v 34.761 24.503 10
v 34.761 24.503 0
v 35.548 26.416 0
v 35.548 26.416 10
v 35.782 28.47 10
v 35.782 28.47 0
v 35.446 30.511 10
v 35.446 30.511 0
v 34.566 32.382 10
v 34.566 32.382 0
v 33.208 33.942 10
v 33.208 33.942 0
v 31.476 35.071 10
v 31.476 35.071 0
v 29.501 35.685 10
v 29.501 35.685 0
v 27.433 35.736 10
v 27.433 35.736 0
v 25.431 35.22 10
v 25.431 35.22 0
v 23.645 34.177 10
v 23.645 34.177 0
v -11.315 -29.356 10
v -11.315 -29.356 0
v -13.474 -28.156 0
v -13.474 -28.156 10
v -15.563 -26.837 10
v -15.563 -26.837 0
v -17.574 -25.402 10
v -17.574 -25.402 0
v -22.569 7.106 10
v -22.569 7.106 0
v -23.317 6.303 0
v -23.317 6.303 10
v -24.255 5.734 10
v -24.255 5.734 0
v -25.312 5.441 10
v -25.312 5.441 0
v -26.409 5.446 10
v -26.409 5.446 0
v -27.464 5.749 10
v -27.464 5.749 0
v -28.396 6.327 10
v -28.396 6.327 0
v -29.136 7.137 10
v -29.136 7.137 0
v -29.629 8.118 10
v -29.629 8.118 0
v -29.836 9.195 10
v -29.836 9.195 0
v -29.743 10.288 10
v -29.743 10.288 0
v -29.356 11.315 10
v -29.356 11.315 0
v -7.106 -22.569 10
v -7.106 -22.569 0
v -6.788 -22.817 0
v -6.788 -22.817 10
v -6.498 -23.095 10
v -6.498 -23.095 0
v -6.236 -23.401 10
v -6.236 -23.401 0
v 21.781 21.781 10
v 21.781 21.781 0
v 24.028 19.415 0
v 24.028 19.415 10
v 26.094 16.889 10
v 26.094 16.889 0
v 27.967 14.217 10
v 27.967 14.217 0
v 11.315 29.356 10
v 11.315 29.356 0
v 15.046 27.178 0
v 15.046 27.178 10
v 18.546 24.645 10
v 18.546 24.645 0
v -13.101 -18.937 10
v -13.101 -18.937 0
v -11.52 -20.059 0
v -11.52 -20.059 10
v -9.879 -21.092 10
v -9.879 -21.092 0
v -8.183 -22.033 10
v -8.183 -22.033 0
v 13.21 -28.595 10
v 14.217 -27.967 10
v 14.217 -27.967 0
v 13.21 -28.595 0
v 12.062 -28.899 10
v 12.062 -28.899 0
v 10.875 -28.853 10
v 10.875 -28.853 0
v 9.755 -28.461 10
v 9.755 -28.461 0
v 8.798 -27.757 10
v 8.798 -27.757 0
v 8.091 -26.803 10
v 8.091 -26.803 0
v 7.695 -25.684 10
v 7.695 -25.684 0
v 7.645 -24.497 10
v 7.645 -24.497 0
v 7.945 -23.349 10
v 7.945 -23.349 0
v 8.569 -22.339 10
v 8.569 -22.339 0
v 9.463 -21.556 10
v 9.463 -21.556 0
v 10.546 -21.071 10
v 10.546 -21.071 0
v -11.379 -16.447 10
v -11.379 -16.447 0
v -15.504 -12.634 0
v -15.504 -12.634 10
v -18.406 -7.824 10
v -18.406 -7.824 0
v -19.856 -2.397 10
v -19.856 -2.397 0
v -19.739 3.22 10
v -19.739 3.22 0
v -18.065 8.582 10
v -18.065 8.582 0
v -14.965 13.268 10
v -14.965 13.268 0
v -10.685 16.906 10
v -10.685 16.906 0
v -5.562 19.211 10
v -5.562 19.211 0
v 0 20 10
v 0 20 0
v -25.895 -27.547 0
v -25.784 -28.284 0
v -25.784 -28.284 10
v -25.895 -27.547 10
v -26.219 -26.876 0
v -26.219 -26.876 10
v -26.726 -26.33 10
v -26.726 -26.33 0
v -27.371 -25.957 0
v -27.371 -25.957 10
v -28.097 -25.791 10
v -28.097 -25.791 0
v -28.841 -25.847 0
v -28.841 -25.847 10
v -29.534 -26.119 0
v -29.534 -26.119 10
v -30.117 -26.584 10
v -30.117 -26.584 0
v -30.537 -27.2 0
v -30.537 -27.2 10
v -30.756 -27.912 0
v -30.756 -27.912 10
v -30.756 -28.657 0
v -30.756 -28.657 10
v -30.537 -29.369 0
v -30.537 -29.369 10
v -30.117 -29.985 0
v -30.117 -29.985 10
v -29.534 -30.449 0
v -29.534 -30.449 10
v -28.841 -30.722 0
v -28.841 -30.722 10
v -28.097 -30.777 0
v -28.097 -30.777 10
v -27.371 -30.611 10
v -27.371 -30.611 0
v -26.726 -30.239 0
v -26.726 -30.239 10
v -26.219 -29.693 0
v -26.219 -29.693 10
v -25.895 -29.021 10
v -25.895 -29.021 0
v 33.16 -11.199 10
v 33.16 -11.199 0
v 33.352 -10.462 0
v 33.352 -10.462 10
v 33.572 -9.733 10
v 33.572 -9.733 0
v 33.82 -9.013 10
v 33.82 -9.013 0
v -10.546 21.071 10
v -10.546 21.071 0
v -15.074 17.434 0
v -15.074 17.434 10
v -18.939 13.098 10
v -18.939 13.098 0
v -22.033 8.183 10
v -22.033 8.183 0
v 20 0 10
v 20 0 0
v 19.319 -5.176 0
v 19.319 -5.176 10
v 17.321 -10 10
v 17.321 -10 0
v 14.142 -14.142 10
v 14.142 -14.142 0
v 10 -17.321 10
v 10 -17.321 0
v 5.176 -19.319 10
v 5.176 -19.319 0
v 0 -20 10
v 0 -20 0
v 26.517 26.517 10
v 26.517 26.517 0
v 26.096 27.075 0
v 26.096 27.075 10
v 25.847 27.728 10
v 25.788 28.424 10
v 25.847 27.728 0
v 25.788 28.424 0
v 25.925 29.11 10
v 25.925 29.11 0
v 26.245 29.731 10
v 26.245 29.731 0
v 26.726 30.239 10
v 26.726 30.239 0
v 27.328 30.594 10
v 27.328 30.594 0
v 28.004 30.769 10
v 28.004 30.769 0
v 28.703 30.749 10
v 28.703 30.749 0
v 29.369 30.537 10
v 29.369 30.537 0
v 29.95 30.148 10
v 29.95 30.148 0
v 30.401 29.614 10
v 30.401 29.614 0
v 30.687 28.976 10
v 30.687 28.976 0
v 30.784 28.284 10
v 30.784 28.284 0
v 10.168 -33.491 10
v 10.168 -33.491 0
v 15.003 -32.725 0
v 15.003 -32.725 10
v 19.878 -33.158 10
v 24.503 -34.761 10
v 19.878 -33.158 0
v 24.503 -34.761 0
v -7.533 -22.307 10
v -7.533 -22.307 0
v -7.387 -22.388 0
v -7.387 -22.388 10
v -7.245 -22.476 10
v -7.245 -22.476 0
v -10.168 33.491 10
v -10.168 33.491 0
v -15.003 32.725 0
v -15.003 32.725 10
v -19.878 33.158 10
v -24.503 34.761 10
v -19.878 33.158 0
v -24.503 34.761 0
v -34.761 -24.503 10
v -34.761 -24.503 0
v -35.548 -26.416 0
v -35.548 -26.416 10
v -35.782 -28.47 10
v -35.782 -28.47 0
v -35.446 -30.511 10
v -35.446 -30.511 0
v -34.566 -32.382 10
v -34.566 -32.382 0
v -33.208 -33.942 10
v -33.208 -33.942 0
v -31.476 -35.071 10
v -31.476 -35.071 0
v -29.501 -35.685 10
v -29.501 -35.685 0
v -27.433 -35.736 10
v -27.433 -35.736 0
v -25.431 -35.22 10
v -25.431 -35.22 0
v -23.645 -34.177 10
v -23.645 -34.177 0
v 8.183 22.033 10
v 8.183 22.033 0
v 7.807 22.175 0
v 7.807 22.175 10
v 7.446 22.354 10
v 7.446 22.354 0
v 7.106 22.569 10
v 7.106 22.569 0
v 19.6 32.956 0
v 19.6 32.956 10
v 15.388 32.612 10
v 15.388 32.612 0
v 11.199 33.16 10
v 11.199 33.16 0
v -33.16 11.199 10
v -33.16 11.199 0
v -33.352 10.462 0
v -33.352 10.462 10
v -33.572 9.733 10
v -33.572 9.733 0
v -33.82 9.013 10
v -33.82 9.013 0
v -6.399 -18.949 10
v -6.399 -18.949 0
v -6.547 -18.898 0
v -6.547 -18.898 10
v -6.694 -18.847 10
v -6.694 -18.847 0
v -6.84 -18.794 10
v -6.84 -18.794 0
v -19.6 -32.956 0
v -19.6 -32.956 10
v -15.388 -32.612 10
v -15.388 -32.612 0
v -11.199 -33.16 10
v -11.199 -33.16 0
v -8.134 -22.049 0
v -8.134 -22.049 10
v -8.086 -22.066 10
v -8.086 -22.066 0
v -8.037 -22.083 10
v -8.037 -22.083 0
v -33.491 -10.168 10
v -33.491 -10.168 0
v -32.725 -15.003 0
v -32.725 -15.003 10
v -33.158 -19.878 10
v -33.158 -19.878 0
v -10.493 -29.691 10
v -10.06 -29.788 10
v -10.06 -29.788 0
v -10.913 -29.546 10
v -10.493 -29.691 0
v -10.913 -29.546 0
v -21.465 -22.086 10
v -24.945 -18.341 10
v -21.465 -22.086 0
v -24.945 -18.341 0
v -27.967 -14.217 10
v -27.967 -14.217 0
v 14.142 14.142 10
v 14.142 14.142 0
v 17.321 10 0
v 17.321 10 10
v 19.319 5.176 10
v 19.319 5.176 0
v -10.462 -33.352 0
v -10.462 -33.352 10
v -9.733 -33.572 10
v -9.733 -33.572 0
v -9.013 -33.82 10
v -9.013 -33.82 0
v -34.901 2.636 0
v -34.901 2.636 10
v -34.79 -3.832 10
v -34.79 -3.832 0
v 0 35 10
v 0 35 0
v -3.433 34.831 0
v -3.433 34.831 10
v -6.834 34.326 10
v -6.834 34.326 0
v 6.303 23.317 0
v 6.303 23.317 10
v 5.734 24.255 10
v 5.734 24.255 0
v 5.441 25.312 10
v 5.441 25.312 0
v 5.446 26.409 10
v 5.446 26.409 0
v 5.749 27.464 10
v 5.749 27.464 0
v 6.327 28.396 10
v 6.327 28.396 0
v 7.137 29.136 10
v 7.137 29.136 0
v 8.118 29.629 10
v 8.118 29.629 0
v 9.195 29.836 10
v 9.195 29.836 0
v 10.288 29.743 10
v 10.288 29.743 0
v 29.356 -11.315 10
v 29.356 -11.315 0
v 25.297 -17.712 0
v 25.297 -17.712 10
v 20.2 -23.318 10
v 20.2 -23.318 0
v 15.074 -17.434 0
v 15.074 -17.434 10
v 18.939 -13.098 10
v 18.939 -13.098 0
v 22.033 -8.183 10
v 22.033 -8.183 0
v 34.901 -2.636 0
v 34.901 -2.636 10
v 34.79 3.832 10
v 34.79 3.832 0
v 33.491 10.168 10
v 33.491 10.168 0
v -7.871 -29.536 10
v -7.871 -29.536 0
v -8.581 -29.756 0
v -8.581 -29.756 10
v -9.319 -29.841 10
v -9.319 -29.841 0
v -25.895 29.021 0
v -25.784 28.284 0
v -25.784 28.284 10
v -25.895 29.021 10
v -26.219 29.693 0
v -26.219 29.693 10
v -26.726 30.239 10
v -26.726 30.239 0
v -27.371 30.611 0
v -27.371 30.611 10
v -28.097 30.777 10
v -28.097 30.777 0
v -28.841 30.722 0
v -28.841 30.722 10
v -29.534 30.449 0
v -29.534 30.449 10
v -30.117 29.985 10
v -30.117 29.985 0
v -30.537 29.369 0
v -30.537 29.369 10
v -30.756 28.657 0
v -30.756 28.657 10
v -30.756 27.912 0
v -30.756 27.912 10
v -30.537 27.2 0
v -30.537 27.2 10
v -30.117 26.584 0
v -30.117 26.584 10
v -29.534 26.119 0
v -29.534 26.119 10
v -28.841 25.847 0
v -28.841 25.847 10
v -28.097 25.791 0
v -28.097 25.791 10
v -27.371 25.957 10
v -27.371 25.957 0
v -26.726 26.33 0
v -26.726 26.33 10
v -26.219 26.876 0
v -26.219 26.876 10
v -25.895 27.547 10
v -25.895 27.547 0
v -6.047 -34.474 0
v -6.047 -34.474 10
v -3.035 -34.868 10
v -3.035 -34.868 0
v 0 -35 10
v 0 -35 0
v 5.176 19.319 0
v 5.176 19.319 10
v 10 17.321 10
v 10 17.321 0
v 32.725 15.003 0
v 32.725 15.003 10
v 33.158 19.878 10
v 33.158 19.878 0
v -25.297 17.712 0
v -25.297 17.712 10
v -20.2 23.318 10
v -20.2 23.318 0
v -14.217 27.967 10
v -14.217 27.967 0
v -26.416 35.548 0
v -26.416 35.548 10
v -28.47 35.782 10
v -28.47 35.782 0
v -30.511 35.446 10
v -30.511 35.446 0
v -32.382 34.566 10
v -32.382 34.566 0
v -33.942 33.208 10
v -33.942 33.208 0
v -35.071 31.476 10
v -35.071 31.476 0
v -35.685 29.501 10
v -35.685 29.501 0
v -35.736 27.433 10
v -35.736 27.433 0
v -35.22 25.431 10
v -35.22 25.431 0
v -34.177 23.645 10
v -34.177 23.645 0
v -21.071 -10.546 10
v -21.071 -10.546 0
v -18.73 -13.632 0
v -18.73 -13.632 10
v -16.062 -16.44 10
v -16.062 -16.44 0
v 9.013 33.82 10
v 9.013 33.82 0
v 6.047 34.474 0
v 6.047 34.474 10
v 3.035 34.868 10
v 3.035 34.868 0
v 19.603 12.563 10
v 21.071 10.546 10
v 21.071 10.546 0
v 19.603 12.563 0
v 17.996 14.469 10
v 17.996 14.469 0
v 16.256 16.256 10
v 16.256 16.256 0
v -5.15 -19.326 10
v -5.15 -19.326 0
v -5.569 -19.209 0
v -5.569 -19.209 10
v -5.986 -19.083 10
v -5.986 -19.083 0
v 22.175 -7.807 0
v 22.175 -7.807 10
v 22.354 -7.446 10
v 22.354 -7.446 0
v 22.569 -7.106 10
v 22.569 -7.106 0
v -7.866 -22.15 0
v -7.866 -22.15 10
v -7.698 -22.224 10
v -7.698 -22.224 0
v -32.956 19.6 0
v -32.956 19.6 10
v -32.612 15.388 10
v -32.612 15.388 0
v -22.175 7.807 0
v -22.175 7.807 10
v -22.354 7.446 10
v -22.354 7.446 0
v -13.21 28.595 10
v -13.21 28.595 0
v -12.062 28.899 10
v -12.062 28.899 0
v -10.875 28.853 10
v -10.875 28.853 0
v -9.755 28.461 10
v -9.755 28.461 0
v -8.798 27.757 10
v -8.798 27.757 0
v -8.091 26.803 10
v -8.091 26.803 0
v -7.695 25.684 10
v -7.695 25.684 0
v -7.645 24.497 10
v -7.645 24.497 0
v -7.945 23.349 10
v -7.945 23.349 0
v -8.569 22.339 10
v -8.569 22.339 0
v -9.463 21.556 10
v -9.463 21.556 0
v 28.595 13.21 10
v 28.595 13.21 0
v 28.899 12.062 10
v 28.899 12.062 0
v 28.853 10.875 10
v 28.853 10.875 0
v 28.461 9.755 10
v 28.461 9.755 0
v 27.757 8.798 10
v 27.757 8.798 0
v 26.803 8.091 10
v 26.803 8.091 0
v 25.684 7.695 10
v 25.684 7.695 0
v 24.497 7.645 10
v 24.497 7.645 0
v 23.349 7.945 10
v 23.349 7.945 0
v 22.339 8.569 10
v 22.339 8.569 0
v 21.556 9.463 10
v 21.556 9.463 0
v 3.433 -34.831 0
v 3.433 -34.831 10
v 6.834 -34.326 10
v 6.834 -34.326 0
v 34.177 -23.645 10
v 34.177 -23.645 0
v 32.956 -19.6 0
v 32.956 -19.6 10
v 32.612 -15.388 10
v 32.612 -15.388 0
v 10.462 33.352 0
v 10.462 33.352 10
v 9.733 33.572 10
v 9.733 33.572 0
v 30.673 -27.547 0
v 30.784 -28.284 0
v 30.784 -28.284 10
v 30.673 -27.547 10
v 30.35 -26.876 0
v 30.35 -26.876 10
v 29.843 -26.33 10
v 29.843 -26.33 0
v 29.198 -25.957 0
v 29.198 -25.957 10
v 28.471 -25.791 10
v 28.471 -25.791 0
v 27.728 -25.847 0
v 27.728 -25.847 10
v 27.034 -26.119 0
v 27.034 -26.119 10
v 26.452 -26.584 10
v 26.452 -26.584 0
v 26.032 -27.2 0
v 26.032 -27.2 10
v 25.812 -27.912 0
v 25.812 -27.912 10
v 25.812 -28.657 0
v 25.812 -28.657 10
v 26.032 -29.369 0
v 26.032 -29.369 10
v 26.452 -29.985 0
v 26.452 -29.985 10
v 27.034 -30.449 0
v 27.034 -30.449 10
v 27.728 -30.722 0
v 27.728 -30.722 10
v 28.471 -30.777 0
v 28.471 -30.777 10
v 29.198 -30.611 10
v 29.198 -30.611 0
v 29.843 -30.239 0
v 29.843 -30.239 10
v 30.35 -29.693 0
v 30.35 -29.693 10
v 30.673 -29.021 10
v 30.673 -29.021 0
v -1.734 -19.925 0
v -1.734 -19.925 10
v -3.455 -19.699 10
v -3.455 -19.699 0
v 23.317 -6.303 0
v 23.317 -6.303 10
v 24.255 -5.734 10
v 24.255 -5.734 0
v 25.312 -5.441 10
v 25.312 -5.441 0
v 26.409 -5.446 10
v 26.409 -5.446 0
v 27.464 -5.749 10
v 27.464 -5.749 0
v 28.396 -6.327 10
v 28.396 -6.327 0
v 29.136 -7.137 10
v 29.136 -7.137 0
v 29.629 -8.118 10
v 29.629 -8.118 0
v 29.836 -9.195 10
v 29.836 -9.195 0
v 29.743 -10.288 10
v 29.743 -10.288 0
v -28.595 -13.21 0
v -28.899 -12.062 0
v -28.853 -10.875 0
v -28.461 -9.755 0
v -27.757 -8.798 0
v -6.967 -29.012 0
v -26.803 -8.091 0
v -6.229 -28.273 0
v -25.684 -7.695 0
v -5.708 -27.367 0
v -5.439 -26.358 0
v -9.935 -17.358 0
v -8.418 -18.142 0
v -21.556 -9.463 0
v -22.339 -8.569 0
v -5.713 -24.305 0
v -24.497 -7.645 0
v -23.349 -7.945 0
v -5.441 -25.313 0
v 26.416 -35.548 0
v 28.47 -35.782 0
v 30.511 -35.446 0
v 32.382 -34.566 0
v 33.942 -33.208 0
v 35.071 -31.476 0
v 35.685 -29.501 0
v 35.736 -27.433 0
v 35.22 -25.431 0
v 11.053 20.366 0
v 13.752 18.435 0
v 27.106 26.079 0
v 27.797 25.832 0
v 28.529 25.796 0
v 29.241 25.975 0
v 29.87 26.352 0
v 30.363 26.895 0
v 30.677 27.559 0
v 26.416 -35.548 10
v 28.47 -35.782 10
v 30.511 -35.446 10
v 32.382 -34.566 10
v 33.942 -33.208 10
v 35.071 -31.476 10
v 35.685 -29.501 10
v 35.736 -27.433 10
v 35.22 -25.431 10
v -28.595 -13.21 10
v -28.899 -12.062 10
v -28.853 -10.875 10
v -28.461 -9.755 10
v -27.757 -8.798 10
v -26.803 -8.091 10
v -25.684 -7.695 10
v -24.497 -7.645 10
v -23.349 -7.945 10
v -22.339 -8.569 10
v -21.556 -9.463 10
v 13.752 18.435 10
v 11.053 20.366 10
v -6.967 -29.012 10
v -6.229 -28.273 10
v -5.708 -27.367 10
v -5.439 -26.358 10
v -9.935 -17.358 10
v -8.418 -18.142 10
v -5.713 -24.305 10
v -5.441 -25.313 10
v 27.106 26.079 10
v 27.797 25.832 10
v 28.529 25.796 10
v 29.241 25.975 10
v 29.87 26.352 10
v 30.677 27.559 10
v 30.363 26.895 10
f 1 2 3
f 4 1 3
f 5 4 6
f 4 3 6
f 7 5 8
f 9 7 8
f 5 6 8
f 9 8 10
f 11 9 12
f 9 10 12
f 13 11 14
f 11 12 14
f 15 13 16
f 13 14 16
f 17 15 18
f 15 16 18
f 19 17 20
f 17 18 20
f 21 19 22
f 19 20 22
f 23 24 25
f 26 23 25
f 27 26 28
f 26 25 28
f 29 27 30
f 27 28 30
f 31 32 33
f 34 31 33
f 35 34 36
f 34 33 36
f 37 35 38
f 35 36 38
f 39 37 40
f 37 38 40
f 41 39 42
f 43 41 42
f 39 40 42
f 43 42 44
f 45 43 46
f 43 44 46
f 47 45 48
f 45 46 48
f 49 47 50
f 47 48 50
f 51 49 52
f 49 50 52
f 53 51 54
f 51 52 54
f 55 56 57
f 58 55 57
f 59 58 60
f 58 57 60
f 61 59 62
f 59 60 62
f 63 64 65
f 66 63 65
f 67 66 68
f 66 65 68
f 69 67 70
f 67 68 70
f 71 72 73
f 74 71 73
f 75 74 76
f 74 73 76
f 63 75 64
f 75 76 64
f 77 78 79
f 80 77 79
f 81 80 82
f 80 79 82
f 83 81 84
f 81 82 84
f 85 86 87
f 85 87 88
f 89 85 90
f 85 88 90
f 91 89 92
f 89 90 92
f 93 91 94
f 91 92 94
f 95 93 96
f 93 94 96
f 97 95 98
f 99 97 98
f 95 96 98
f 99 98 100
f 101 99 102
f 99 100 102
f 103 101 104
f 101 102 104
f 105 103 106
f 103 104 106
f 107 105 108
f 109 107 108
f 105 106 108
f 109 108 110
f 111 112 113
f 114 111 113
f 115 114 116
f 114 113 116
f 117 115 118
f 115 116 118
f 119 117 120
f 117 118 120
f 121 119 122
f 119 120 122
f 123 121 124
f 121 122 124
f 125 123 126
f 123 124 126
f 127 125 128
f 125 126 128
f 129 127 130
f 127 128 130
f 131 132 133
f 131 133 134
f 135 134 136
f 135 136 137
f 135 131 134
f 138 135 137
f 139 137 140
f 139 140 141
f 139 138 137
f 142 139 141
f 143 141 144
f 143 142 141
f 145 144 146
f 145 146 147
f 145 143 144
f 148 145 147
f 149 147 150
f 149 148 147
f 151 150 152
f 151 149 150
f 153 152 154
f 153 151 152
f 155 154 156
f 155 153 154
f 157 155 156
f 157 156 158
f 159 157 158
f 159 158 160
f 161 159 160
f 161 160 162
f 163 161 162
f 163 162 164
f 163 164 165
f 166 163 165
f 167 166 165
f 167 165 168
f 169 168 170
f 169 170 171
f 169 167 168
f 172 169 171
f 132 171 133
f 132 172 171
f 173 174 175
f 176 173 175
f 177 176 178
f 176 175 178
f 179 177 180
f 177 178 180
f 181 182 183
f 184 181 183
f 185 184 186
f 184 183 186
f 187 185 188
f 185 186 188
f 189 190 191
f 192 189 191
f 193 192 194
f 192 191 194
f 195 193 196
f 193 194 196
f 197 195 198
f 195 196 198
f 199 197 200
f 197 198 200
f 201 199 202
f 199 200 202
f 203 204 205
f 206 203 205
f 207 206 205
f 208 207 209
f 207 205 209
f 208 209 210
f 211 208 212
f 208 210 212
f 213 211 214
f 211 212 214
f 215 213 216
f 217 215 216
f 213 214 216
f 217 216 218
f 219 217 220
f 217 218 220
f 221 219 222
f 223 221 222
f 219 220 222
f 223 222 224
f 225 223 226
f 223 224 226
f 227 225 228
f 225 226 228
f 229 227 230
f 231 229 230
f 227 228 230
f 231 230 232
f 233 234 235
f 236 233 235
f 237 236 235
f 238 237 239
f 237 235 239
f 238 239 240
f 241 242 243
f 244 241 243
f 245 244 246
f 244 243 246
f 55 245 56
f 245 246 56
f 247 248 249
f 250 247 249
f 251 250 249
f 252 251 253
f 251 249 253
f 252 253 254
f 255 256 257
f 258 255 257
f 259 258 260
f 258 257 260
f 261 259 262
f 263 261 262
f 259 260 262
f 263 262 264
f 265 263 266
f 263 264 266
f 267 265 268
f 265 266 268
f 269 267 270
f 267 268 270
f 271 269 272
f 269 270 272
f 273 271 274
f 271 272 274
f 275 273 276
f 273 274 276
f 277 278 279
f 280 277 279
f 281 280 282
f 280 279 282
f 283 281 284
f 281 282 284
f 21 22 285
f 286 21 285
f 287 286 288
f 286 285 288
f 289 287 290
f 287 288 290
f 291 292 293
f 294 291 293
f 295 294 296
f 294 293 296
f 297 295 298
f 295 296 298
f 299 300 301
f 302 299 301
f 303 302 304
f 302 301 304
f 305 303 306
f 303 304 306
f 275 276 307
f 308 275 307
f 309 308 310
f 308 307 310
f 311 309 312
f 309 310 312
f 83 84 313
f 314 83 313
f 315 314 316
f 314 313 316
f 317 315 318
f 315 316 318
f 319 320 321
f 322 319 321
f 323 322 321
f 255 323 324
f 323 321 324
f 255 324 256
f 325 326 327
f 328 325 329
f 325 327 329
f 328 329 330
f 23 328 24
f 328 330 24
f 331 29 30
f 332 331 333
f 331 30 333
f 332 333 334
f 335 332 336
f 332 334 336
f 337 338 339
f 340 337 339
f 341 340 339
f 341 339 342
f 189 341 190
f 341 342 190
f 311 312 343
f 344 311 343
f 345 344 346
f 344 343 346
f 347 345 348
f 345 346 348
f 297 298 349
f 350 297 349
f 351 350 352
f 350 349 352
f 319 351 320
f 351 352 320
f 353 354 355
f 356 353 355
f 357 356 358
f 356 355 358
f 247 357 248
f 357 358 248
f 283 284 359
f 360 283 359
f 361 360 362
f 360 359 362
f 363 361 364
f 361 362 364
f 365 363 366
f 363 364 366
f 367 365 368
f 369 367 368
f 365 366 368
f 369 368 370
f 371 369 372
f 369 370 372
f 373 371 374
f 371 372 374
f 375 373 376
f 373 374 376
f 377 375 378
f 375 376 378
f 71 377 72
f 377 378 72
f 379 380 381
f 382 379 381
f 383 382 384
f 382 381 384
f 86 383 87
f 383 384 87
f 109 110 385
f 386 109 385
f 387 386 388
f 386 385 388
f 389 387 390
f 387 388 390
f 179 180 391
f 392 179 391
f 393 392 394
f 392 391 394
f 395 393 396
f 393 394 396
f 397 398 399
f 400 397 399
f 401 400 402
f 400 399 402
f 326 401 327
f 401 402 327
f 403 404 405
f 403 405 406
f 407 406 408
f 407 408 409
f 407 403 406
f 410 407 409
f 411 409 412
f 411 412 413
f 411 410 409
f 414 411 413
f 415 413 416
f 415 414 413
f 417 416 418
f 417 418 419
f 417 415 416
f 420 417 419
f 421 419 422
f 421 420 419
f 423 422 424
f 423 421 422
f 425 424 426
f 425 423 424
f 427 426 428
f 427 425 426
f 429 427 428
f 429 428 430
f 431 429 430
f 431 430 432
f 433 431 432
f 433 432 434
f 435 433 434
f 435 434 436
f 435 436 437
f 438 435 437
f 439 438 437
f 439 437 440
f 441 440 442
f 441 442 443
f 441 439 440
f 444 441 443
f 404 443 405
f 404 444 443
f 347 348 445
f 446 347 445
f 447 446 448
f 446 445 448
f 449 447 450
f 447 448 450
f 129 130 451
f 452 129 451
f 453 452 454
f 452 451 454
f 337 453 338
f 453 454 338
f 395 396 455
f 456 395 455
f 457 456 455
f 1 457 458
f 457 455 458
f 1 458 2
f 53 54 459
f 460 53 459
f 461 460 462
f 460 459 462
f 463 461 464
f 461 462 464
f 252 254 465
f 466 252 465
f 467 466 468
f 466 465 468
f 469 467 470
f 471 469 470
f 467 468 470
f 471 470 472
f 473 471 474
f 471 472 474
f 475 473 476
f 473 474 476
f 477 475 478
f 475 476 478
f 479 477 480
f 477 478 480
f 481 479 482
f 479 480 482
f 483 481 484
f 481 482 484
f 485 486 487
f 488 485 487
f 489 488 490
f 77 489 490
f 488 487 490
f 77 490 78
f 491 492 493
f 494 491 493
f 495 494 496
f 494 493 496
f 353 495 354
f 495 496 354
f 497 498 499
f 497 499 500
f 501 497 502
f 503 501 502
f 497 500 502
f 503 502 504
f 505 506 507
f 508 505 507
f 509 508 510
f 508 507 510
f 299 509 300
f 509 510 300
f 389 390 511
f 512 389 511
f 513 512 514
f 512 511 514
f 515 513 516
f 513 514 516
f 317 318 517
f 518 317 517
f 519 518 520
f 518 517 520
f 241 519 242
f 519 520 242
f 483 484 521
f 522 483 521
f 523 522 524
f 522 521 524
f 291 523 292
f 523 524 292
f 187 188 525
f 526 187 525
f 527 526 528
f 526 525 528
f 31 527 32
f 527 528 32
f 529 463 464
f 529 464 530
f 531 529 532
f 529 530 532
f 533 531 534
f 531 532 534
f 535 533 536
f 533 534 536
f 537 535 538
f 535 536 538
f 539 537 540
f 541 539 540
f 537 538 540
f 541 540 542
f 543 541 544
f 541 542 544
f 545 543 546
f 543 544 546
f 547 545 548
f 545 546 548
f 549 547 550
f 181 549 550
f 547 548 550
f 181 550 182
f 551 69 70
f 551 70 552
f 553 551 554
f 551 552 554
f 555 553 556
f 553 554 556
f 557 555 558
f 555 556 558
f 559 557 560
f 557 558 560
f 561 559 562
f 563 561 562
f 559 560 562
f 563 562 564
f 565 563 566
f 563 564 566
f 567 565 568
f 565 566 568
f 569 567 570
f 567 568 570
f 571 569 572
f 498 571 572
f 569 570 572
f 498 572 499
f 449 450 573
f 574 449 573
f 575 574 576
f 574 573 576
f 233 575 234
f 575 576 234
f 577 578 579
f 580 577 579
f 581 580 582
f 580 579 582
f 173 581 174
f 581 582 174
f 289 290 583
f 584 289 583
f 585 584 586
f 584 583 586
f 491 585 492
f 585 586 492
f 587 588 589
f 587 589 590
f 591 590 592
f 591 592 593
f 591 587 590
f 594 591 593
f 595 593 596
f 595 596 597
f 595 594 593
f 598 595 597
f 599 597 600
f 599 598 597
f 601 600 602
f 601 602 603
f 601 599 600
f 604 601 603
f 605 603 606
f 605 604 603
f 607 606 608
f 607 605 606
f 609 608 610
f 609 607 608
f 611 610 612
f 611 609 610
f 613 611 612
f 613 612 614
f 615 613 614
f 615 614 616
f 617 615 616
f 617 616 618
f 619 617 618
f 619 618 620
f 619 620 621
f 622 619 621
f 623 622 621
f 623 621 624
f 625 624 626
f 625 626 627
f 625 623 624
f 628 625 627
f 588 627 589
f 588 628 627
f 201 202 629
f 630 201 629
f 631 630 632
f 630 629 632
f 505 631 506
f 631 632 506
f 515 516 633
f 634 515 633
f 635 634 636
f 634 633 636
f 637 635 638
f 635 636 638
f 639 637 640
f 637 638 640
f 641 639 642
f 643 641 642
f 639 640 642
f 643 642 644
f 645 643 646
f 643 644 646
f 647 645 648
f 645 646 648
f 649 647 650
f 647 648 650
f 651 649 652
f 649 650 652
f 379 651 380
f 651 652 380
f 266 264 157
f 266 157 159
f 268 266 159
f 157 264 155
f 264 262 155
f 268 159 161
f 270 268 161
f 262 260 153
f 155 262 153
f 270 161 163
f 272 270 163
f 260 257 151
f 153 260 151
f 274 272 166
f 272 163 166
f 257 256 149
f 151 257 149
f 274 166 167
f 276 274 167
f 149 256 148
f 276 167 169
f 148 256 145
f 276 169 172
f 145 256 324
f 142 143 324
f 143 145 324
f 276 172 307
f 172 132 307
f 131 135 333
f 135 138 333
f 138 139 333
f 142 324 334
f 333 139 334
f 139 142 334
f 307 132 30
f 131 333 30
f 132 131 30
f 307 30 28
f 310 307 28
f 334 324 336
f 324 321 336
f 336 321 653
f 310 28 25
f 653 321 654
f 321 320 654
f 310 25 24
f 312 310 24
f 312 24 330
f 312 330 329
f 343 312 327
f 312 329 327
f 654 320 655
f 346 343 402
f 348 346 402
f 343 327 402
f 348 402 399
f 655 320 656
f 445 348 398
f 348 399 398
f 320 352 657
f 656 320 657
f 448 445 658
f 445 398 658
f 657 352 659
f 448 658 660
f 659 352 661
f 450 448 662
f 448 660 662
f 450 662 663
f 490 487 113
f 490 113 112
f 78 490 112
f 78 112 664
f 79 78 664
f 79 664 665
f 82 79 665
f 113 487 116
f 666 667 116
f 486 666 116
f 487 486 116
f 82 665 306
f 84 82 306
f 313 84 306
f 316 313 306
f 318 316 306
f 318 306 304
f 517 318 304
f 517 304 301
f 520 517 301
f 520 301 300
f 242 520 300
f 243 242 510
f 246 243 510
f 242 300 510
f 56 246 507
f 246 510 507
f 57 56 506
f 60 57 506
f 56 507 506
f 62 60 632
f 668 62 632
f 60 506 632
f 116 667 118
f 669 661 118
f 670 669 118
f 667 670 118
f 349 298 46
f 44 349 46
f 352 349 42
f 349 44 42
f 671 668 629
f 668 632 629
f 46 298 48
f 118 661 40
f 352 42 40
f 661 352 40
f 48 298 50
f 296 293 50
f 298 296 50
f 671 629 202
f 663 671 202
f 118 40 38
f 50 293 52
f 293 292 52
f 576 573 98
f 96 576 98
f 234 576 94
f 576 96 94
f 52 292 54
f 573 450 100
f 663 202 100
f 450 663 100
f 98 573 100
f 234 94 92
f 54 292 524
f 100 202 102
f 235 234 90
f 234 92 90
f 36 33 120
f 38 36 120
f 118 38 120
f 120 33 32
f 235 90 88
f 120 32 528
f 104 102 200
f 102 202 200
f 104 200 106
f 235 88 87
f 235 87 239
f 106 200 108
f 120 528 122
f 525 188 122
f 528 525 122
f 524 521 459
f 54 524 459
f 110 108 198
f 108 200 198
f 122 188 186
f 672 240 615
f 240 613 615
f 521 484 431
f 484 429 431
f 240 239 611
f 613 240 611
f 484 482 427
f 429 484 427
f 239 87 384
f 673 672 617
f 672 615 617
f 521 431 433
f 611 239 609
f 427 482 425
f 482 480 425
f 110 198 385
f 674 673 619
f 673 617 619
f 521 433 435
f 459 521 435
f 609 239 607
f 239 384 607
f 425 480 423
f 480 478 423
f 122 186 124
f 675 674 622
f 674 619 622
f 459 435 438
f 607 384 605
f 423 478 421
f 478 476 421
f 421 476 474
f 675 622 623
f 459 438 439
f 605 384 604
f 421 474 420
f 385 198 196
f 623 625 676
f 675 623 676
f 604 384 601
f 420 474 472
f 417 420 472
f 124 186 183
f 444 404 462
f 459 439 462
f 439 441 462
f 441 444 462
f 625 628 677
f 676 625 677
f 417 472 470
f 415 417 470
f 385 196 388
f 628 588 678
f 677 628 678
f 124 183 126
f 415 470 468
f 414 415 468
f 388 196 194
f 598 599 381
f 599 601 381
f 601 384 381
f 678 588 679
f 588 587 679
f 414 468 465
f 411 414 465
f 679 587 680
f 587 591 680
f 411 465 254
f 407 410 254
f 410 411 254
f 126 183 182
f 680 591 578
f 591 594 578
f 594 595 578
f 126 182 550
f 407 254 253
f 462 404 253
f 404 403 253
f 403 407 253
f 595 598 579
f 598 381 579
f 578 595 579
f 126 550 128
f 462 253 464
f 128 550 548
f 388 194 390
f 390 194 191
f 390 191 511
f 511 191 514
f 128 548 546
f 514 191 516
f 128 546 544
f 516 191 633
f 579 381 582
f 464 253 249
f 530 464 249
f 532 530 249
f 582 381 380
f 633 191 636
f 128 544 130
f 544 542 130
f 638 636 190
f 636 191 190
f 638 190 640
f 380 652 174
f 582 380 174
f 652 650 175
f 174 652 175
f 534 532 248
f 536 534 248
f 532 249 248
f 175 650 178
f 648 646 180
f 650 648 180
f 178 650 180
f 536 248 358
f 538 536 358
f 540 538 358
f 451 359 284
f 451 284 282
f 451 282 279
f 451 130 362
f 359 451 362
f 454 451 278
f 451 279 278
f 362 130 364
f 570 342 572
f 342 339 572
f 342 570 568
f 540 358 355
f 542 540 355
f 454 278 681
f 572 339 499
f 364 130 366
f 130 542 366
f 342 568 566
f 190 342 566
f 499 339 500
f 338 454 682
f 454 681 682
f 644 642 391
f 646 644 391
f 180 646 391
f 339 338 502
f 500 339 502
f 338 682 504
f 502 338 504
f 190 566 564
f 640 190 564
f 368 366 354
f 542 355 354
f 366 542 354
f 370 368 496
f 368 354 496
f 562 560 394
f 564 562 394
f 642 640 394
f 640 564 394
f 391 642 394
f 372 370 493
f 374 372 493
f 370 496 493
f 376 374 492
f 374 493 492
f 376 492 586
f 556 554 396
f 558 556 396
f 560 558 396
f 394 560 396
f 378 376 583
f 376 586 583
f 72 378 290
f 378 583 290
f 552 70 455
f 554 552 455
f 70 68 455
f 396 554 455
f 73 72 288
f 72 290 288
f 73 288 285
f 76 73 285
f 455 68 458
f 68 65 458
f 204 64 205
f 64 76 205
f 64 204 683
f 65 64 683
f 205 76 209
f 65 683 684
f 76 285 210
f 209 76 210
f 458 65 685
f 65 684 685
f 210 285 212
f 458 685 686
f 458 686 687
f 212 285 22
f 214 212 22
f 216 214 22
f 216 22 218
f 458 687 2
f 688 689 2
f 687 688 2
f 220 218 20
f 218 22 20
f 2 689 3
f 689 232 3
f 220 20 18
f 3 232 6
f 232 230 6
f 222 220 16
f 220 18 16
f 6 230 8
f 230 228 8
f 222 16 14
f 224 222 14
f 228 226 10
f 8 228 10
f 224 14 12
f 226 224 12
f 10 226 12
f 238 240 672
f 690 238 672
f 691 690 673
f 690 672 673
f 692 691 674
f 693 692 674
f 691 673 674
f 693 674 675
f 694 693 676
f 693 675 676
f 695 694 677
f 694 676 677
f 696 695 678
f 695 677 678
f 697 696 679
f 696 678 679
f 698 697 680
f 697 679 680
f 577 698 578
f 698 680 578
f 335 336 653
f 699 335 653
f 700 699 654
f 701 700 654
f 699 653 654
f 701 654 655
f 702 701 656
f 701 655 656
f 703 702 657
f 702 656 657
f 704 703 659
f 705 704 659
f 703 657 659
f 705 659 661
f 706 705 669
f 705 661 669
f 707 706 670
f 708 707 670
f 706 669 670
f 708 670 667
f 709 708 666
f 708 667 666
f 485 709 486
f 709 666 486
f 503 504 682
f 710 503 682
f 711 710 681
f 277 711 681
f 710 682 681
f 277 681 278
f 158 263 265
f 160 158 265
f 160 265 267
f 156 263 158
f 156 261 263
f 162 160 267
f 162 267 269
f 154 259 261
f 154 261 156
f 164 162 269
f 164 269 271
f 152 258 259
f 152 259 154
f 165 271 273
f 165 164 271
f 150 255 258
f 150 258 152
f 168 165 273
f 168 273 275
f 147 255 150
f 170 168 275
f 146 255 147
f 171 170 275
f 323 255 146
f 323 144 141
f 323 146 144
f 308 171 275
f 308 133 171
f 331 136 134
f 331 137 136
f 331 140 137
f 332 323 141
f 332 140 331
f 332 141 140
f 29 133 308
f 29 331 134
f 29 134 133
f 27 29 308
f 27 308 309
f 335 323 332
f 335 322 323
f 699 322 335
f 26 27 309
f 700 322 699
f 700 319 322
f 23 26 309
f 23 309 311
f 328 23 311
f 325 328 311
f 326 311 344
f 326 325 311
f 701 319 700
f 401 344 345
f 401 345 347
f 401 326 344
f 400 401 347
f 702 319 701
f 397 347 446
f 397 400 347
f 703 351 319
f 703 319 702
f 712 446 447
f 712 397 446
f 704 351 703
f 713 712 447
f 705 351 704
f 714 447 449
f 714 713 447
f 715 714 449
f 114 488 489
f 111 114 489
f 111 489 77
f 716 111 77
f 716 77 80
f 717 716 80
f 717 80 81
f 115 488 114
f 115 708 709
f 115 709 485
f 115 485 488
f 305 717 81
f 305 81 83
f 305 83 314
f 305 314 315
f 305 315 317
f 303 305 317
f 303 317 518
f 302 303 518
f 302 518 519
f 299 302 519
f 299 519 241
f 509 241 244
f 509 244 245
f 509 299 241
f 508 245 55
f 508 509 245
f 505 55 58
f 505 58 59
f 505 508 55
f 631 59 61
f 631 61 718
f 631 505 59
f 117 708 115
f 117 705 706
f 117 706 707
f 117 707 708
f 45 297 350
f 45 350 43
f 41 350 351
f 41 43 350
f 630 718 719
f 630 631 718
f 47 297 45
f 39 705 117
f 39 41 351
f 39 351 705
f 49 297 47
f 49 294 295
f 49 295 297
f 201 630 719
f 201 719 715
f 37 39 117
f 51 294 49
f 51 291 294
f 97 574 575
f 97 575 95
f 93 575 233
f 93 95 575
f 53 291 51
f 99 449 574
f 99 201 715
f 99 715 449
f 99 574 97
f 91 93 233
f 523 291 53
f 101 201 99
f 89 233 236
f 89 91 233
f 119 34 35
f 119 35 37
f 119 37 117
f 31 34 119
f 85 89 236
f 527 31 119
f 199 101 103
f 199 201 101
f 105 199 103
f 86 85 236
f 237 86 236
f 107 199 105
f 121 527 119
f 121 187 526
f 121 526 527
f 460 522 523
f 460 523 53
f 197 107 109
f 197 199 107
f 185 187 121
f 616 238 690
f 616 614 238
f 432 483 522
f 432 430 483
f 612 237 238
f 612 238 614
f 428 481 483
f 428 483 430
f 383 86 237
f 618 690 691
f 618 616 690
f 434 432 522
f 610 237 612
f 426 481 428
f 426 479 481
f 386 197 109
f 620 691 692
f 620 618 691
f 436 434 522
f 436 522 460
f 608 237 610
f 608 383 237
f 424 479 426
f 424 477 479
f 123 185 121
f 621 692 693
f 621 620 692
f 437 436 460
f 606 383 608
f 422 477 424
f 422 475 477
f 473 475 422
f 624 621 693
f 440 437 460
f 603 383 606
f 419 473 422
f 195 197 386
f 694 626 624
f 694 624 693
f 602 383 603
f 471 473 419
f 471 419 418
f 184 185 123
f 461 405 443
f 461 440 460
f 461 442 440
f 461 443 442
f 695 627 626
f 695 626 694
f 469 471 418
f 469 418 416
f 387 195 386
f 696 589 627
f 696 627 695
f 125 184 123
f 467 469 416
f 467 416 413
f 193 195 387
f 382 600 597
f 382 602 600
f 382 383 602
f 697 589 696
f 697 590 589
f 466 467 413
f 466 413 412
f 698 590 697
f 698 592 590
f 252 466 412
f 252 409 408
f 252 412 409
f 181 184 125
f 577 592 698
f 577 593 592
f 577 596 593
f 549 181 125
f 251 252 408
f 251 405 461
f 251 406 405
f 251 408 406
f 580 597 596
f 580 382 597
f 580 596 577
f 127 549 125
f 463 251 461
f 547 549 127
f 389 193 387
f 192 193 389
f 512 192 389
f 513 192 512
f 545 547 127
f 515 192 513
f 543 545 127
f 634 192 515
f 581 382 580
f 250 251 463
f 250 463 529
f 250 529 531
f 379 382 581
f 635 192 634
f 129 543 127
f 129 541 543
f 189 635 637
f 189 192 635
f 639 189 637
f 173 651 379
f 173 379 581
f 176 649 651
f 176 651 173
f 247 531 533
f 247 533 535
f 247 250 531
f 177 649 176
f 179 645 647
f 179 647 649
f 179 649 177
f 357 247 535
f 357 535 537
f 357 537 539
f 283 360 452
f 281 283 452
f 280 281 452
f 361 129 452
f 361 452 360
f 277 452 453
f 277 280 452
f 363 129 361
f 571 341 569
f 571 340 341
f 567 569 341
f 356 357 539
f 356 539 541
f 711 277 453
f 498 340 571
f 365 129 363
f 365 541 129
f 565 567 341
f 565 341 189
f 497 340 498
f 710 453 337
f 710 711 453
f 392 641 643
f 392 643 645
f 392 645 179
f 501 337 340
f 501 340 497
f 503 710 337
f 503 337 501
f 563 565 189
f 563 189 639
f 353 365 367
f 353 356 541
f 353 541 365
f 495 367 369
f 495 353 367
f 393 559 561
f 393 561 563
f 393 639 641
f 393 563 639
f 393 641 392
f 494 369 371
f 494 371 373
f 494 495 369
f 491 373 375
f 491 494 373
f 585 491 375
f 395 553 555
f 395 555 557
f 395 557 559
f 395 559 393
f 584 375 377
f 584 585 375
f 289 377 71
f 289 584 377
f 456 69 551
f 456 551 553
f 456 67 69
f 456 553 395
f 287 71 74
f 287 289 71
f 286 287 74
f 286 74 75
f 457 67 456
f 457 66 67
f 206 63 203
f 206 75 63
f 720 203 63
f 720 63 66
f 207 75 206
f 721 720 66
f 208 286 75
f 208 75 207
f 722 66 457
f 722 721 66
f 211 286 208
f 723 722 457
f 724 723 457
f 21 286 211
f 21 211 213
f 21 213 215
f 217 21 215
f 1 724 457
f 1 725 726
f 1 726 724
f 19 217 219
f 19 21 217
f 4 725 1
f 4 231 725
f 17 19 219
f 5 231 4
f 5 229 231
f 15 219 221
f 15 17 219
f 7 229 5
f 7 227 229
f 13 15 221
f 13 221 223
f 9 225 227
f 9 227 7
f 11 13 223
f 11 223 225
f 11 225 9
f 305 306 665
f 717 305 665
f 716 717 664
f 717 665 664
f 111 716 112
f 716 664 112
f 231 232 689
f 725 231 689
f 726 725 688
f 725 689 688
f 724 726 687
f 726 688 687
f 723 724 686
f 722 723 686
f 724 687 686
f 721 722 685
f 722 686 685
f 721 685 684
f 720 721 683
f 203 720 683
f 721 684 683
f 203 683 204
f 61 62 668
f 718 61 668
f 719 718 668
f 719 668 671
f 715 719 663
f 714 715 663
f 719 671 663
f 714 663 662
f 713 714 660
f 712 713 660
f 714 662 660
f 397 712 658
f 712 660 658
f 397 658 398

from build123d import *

# Parameters (mm, degrees)
F0_R     = 2.5
F1_DEPTH = 10


with BuildPart() as f1:
    # F0 (on Top) → F1 (new body)
    with BuildSketch(Plane.XY):
        with BuildLine():
            Line((0, 20), (0, 35))
            ThreePointArc((0, 35), (-5.139641441, 34.620573159), (-10.1678475726, 33.4905191919))
            ThreePointArc((-10.1678475726, 33.4905191919), (-17.4537155293, 32.7918602935), (-24.5030527862, 34.7613374775))
            ThreePointArc((-24.5030527862, 34.7613374775), (-33.9418390183, 33.2078803829), (-34.1772546288, 23.6450097903))
            ThreePointArc((-34.1772546288, 23.6450097903), (-32.6723351007, 17.5032995342), (-33.160041137, 11.1987352765))
            ThreePointArc((-33.160041137, 11.1987352765), (-33.458628369, 10.0963588308), (-33.819654198, 9.012823638))
            ThreePointArc((-33.819654198, 9.012823638), (-34.994848156, -0.6005019029), (-33.4905191919, -10.1678475726))
            ThreePointArc((-33.4905191919, -10.1678475726), (-32.7918602935, -17.4537155293), (-34.7613374775, -24.5030527862))
            ThreePointArc((-34.7613374775, -24.5030527862), (-33.2078803829, -33.9418390183), (-23.6450097903, -34.1772546288))
            Line((-23.6450097903, -34.1772546288), (-17.5740434932, -25.4020854569))
            ThreePointArc((-17.5740434932, -25.4020854569), (-23.2594177785, -20.2640007089), (-27.9671079942, -14.2174274252))
            ThreePointArc((-27.9671079942, -14.2174274252), (-28.3098834226, -13.75089028), (-28.5817235471, -13.2397593292))
            ThreePointArc((-28.5817235471, -13.2397593292), (-26.2736614667, -7.8567708386), (-21.0708003204, -10.5463714686))
            ThreePointArc((-21.0708003204, -10.5463714686), (-17.4350672969, -15.0731601026), (-13.1010093591, -18.936618624))
            Line((-13.1010093591, -18.936618624), (-11.3789397329, -16.447484019))
            ThreePointArc((-11.3789397329, -16.447484019), (-19.0912241669, 5.9602986343), (0, 20))
        make_face()
        with Locations((-28.2842712475, -28.2842712475)):
            Circle(F0_R, mode=Mode.SUBTRACT)
        with BuildLine():
            ThreePointArc((-13.2397593292, 28.5817235471), (-7.8567708386, 26.2736614667), (-10.5463714686, 21.0708003204))
            ThreePointArc((-10.5463714686, 21.0708003204), (-17.096723239, 15.3462606412), (-22.0329337989, 8.1830708377))
            ThreePointArc((-22.0329337989, 8.1830708377), (-22.2601624756, 7.6240701847), (-22.5688933039, 7.1056110472))
            ThreePointArc((-22.5688933039, 7.1056110472), (-27.9497329821, 6.0062080975), (-29.3563625566, 11.3150230056))
            ThreePointArc((-29.3563625566, 11.3150230056), (-22.869546271, 20.6253378904), (-14.2174274252, 27.9671079942))
            ThreePointArc((-14.2174274252, 27.9671079942), (-13.75089028, 28.3098834226), (-13.2397593292, 28.5817235471))
        make_face(mode=Mode.SUBTRACT)
        with Locations((-28.2842712475, 28.2842712475)):
            Circle(F0_R, mode=Mode.SUBTRACT)
        with BuildLine():
            ThreePointArc((9.012823638, 33.819654198), (4.5448929069, 34.7036590069), (0, 35))
            Line((0, 35), (0, 20))
            ThreePointArc((0, 20), (7.6536686473, 18.4775906502), (14.1421356237, 14.1421356237))
            ThreePointArc((14.1421356237, 14.1421356237), (18.4775906502, 7.6536686473), (20, 0))
            ThreePointArc((20, 0), (14.1421356237, -14.1421356237), (0, -20))
            Line((0, -20), (0, -35))
            ThreePointArc((0, -35), (5.139641441, -34.620573159), (10.1678475726, -33.4905191919))
            ThreePointArc((10.1678475726, -33.4905191919), (17.4537155293, -32.7918602935), (24.5030527862, -34.7613374775))
            ThreePointArc((24.5030527862, -34.7613374775), (33.9418390183, -33.2078803829), (34.1772546288, -23.6450097903))
            ThreePointArc((34.1772546288, -23.6450097903), (32.6723351007, -17.5032995342), (33.160041137, -11.1987352765))
            ThreePointArc((33.160041137, -11.1987352765), (33.458628369, -10.0963588308), (33.819654198, -9.012823638))
            ThreePointArc((33.819654198, -9.012823638), (34.994848156, 0.6005019029), (33.4905191919, 10.1678475726))
            ThreePointArc((33.4905191919, 10.1678475726), (32.7918602935, 17.4537155293), (34.7613374775, 24.5030527862))
            ThreePointArc((34.7613374775, 24.5030527862), (33.2078803829, 33.9418390183), (23.6450097903, 34.1772546288))
            ThreePointArc((23.6450097903, 34.1772546288), (17.5032995342, 32.6723351007), (11.1987352765, 33.160041137))
            ThreePointArc((11.1987352765, 33.160041137), (10.0963588308, 33.458628369), (9.012823638, 33.819654198))
        make_face()
        with Locations((28.2842712475, -28.2842712475)):
            Circle(F0_R, mode=Mode.SUBTRACT)
        with BuildLine():
            ThreePointArc((13.2397593292, -28.5817235471), (7.8567708386, -26.2736614667), (10.5463714686, -21.0708003204))
            ThreePointArc((10.5463714686, -21.0708003204), (17.096723239, -15.3462606412), (22.0329337989, -8.1830708377))
            ThreePointArc((22.0329337989, -8.1830708377), (22.2601624756, -7.6240701847), (22.5688933039, -7.1056110472))
            ThreePointArc((22.5688933039, -7.1056110472), (27.9497329821, -6.0062080975), (29.3563625566, -11.3150230056))
            ThreePointArc((29.3563625566, -11.3150230056), (22.869546271, -20.6253378904), (14.2174274252, -27.9671079942))
            ThreePointArc((14.2174274252, -27.9671079942), (13.75089028, -28.3098834226), (13.2397593292, -28.5817235471))
        make_face(mode=Mode.SUBTRACT)
        with BuildLine():
            ThreePointArc((21.0708003204, 10.5463714686), (18.8162828052, 13.5301163041), (16.2562788277, 16.2562788277))
            ThreePointArc((16.2562788277, 16.2562788277), (12.4255192438, 19.432285732), (8.1830708377, 22.0329337989))
            ThreePointArc((8.1830708377, 22.0329337989), (7.6240701847, 22.2601624756), (7.1056110472, 22.5688933039))
            ThreePointArc((7.1056110472, 22.5688933039), (6.0062080975, 27.9497329821), (11.3150230056, 29.3563625566))
            ThreePointArc((11.3150230056, 29.3563625566), (16.8273746655, 25.9546878233), (21.7805752556, 21.7805752556))
            ThreePointArc((21.7805752556, 21.7805752556), (25.0844366917, 18.1712647028), (27.9671079942, 14.2174274252))
            ThreePointArc((27.9671079942, 14.2174274252), (28.3098834226, 13.75089028), (28.5817235471, 13.2397593292))
            ThreePointArc((28.5817235471, 13.2397593292), (26.2736614667, 7.8567708386), (21.0708003204, 10.5463714686))
        make_face(mode=Mode.SUBTRACT)
        with BuildLine():
            ThreePointArc((30.7842712475, 28.2842712475), (29.2409798284, 25.9745724162), (26.5165042945, 26.5165042945))
            ThreePointArc((26.5165042945, 26.5165042945), (27.3275626665, 30.5939700787), (30.7842712475, 28.2842712475))
        make_face(mode=Mode.SUBTRACT)
        with BuildLine():
            ThreePointArc((-6.8404028665, -18.7938524157), (-9.1849045913, -17.7661905778), (-11.3789397329, -16.447484019))
            Line((-11.3789397329, -16.447484019), (-13.1010093591, -18.936618624))
            ThreePointArc((-13.1010093591, -18.936618624), (-10.7064161122, -20.587025905), (-8.1830708377, -22.0329337989))
            ThreePointArc((-8.1830708377, -22.0329337989), (-8.1100323796, -22.0571549298), (-8.0374733682, -22.0827765885))
            Line((-8.0374733682, -22.0827765885), (-6.8404028665, -18.7938524157))
        make_face()
        with BuildLine():
            ThreePointArc((-9.012823638, -33.819654198), (-4.5448929069, -34.7036590069), (0, -35))
            Line((0, -35), (0, -20))
            ThreePointArc((0, -20), (-2.5970816611, -19.8306622896), (-5.150184936, -19.3255166846))
            Line((-5.150184936, -19.3255166846), (-6.2363085662, -23.4010791347))
            ThreePointArc((-6.2363085662, -23.4010791347), (-5.5404506045, -26.8715840588), (-7.8711189882, -29.5355299322))
            Line((-7.8711189882, -29.5355299322), (-9.012823638, -33.819654198))
        make_face()
        with BuildLine():
            ThreePointArc((-5.150184936, -19.3255166846), (-5.7778055515, -19.1472442667), (-6.3992773009, -18.9485949354))
            Line((-6.3992773009, -18.9485949354), (-7.5333779836, -22.3067263997))
            ThreePointArc((-7.5333779836, -22.3067263997), (-7.315380073, -22.4310964856), (-7.1056110472, -22.5688933039))
            ThreePointArc((-7.1056110472, -22.5688933039), (-6.6394848179, -22.9521074021), (-6.2363085662, -23.4010791347))
            Line((-6.2363085662, -23.4010791347), (-5.150184936, -19.3255166846))
        make_face()
        with BuildLine():
            ThreePointArc((-11.1987352765, -33.160041137), (-10.0963588308, -33.458628369), (-9.012823638, -33.819654198))
            Line((-9.012823638, -33.819654198), (-7.8711189882, -29.5355299322))
            ThreePointArc((-7.8711189882, -29.5355299322), (-8.9477708121, -29.8152650544), (-10.0598273225, -29.7876750907))
            Line((-10.0598273225, -29.7876750907), (-11.1987352765, -33.160041137))
        make_face()
        with BuildLine():
            ThreePointArc((-23.6450097903, -34.1772546288), (-17.5032995342, -32.6723351007), (-11.1987352765, -33.160041137))
            Line((-11.1987352765, -33.160041137), (-10.0598273225, -29.7876750907))
            ThreePointArc((-10.0598273225, -29.7876750907), (-10.7054391121, -29.6244425953), (-11.3150230056, -29.3563625566))
            ThreePointArc((-11.3150230056, -29.3563625566), (-14.5278498189, -27.5111014909), (-17.5740434932, -25.4020854569))
            Line((-17.5740434932, -25.4020854569), (-23.6450097903, -34.1772546288))
        make_face()
        with BuildLine():
            ThreePointArc((-6.3992773009, -18.9485949354), (-6.6202922175, -18.8725125766), (-6.8404028665, -18.7938524157))
            Line((-6.8404028665, -18.7938524157), (-8.0374733682, -22.0827765885))
            ThreePointArc((-8.0374733682, -22.0827765885), (-7.7815607221, -22.1860517531), (-7.5333779836, -22.3067263997))
            Line((-7.5333779836, -22.3067263997), (-6.3992773009, -18.9485949354))
        make_face()
    extrude(amount=F1_DEPTH)


solid = f1.part
